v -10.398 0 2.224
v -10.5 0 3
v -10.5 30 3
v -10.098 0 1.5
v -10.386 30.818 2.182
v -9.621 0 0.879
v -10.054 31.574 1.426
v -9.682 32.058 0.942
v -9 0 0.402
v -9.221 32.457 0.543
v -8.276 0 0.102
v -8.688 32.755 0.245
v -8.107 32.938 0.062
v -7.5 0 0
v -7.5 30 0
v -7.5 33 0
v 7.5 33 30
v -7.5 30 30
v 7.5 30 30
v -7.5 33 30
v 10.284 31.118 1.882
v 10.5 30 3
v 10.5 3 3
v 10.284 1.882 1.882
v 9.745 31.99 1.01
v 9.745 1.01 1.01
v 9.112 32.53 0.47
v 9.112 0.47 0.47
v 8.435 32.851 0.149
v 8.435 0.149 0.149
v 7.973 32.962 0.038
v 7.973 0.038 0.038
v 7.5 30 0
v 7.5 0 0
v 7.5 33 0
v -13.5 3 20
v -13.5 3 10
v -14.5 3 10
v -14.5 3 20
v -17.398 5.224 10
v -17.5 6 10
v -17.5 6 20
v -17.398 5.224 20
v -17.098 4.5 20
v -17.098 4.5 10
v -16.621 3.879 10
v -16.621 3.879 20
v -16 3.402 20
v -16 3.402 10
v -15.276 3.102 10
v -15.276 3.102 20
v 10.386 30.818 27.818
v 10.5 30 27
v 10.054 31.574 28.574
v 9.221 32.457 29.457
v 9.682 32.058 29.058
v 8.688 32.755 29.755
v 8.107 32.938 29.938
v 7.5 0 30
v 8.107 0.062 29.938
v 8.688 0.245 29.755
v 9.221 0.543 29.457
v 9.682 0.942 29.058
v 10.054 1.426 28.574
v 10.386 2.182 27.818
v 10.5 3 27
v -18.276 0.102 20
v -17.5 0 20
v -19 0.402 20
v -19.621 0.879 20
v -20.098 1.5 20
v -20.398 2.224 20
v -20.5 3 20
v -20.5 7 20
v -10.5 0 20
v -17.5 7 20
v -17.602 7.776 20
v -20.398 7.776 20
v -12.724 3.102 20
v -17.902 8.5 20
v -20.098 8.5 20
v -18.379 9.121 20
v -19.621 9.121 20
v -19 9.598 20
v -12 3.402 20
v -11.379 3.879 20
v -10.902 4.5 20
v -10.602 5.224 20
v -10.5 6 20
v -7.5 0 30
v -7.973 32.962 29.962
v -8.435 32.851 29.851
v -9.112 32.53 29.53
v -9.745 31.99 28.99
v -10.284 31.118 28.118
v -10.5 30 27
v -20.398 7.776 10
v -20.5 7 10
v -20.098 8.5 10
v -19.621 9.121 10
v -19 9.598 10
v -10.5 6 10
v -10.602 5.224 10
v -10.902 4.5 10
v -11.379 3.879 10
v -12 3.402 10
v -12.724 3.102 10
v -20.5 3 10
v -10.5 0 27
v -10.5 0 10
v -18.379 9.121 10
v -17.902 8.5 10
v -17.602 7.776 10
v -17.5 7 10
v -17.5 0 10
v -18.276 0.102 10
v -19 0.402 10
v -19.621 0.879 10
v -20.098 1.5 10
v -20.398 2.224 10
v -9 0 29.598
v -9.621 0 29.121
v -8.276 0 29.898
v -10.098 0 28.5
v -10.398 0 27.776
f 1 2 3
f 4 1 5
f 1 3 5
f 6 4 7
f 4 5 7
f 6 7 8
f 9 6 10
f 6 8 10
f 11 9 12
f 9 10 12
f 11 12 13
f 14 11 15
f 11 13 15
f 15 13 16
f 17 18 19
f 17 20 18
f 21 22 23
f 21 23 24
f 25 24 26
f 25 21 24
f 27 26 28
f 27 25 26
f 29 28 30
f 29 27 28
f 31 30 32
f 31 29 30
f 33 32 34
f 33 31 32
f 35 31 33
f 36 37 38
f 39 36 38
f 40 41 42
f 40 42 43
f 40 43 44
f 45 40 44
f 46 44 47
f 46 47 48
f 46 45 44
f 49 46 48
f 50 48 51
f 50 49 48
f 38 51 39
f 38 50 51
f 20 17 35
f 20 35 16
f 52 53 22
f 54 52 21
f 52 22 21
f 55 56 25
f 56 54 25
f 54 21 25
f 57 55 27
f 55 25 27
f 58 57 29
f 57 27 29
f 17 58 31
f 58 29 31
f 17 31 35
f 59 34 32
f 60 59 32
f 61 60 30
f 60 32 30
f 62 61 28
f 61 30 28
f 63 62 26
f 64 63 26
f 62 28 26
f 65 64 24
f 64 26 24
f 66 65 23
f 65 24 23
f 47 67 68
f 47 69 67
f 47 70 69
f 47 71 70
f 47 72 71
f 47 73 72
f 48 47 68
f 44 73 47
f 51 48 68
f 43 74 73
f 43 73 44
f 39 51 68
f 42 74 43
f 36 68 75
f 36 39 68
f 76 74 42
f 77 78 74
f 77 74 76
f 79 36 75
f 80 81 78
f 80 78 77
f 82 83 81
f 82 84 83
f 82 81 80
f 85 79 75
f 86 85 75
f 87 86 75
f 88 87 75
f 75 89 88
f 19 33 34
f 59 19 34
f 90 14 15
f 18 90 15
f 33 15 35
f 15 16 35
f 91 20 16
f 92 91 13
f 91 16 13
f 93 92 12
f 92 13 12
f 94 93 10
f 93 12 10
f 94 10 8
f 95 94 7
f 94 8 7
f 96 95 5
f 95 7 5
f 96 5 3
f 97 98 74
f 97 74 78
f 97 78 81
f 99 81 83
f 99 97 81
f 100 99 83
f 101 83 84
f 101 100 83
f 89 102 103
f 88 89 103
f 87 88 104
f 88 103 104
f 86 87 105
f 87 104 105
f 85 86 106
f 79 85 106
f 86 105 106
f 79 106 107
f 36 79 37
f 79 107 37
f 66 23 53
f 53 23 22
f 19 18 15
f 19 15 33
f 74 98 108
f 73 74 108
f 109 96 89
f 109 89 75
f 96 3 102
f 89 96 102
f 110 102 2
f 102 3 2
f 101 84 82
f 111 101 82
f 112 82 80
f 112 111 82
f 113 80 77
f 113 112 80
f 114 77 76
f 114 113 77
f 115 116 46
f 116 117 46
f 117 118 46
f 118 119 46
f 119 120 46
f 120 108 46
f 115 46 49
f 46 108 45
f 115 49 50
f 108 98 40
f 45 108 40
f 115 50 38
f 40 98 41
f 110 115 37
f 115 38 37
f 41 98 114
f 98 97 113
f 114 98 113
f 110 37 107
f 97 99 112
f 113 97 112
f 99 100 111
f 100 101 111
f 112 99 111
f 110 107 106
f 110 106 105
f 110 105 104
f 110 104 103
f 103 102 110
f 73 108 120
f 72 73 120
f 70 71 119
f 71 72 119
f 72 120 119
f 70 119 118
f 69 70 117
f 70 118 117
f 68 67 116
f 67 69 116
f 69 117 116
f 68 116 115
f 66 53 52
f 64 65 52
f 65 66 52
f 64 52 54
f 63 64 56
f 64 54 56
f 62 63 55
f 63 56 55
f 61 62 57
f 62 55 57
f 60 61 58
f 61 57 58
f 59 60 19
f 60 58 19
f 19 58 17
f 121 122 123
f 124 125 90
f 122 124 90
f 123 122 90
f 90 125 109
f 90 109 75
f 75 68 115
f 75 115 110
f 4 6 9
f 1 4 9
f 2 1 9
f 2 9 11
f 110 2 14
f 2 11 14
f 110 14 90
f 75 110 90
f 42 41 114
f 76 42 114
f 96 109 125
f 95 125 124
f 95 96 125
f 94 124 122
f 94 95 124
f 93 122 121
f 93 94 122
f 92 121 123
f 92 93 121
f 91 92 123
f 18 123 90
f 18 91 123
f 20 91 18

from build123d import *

# Parameters (mm, degrees)
F1_DEPTH    = 30
F2_START    = 10
F2_DEPTH    = 10
F3_T1_DEPTH = 10
F3_T3_DEPTH = 25
F3_T5_DEPTH = 48
F3_T7_DEPTH = 45


# Not quite as in the source:
# - a fillet or chamfer that OpenCascade refuses, or shapes differently, is made with other operations: its cross-section is extruded or revolved along the edge and cut away or added


with BuildPart() as f1:
    # F0 (on Top) → F1 (new body)
    with BuildSketch(Plane.XY):
        Polygon((7.5, 30), (7.5, 0), (10.5, 0), (10.5, 33), (-10.5, 33), (-10.5, 3), (-10.5, 0), (-7.5, 0), (-7.5, 30), align=None)
    extrude(amount=F1_DEPTH)

    # F0 (on Top) → F2 (join)
    with BuildSketch(Plane.XY.offset(F2_START)):
        Polygon((7.5, 30), (7.5, 0), (10.5, 0), (10.5, 33), (-10.5, 33), (-10.5, 3), (-10.5, 0), (-7.5, 0), (-7.5, 30), align=None)
        Polygon((-10.5, 0), (-10.5, 3), (-17.5, 3), (-17.5, 10), (-20.5, 10), (-20.5, 0), align=None)
    extrude(amount=F2_DEPTH)

    # F3: fillet of radius 3 on 12 edges, made by hand

    # F3_s2 → F3_t1 (join)
    with BuildSketch(Plane.XY.offset(10)):
        with BuildLine():
            ThreePointArc((-10.5, 6), (-11.3786796564, 3.8786796564), (-13.5, 3))
            Line((-13.5, 3), (-10.5, 3))
            Line((-10.5, 3), (-10.5, 6))
        make_face()
        with BuildLine():
            ThreePointArc((-17.5, 6), (-16.6213203436, 3.8786796564), (-14.5, 3))
            Line((-14.5, 3), (-17.5, 3))
            Line((-17.5, 3), (-17.5, 6))
        make_face()
    extrude(amount=F3_T1_DEPTH)

    # F3_s4 → F3_t3 (cut)
    with BuildSketch(Plane.XY.offset(2.5)):
        with BuildLine():
            ThreePointArc((-20.5, 10), (-18.3786796564, 9.1213203436), (-17.5, 7))
            Line((-17.5, 7), (-17.5, 10))
            Line((-17.5, 10), (-20.5, 10))
        make_face()
        with BuildLine():
            ThreePointArc((-20.5, 3), (-19.6213203436, 0.8786796564), (-17.5, 0))
            Line((-17.5, 0), (-20.5, 0))
            Line((-20.5, 0), (-20.5, 3))
        make_face()
        with BuildLine():
            ThreePointArc((-20.5, 7), (-19.6213203436, 9.1213203436), (-17.5, 10))
            Line((-17.5, 10), (-20.5, 10))
            Line((-20.5, 10), (-20.5, 7))
        make_face()
    extrude(amount=F3_T3_DEPTH, mode=Mode.SUBTRACT)

    # F3_s6 → F3_t5 (cut)
    with BuildSketch(Plane.XZ.offset(-40.5)):
        with BuildLine():
            ThreePointArc((-10.5, 27), (-9.6213203436, 29.1213203436), (-7.5, 30))
            Line((-7.5, 30), (-10.5, 30))
            Line((-10.5, 30), (-10.5, 27))
        make_face()
        with BuildLine():
            ThreePointArc((10.5, 3), (9.6213203436, 0.8786796564), (7.5, 0))
            Line((7.5, 0), (10.5, 0))
            Line((10.5, 0), (10.5, 3))
        make_face()
        with BuildLine():
            ThreePointArc((10.5, 27), (9.6213203436, 29.1213203436), (7.5, 30))
            Line((7.5, 30), (10.5, 30))
            Line((10.5, 30), (10.5, 27))
        make_face()
        with BuildLine():
            ThreePointArc((-10.5, 3), (-9.6213203436, 0.8786796564), (-7.5, 0))
            Line((-7.5, 0), (-10.5, 0))
            Line((-10.5, 0), (-10.5, 3))
        make_face()
    extrude(amount=F3_T5_DEPTH, mode=Mode.SUBTRACT)

    # F3_s8 → F3_t7 (cut)
    with BuildSketch(Plane.XY.offset(-7.5)):
        with BuildLine():
            ThreePointArc((7.5, 0), (9.6213203436, 0.8786796564), (10.5, 3))
            Line((10.5, 3), (10.5, 0))
            Line((10.5, 0), (7.5, 0))
        make_face()
        with BuildLine():
            ThreePointArc((10.5, 30), (9.6213203436, 32.1213203436), (7.5, 33))
            Line((7.5, 33), (10.5, 33))
            Line((10.5, 33), (10.5, 30))
        make_face()
        with BuildLine():
            ThreePointArc((-7.5, 33), (-9.6213203436, 32.1213203436), (-10.5, 30))
            Line((-10.5, 30), (-10.5, 33))
            Line((-10.5, 33), (-7.5, 33))
        make_face()
    extrude(amount=F3_T7_DEPTH, mode=Mode.SUBTRACT)


solid = f1.part
